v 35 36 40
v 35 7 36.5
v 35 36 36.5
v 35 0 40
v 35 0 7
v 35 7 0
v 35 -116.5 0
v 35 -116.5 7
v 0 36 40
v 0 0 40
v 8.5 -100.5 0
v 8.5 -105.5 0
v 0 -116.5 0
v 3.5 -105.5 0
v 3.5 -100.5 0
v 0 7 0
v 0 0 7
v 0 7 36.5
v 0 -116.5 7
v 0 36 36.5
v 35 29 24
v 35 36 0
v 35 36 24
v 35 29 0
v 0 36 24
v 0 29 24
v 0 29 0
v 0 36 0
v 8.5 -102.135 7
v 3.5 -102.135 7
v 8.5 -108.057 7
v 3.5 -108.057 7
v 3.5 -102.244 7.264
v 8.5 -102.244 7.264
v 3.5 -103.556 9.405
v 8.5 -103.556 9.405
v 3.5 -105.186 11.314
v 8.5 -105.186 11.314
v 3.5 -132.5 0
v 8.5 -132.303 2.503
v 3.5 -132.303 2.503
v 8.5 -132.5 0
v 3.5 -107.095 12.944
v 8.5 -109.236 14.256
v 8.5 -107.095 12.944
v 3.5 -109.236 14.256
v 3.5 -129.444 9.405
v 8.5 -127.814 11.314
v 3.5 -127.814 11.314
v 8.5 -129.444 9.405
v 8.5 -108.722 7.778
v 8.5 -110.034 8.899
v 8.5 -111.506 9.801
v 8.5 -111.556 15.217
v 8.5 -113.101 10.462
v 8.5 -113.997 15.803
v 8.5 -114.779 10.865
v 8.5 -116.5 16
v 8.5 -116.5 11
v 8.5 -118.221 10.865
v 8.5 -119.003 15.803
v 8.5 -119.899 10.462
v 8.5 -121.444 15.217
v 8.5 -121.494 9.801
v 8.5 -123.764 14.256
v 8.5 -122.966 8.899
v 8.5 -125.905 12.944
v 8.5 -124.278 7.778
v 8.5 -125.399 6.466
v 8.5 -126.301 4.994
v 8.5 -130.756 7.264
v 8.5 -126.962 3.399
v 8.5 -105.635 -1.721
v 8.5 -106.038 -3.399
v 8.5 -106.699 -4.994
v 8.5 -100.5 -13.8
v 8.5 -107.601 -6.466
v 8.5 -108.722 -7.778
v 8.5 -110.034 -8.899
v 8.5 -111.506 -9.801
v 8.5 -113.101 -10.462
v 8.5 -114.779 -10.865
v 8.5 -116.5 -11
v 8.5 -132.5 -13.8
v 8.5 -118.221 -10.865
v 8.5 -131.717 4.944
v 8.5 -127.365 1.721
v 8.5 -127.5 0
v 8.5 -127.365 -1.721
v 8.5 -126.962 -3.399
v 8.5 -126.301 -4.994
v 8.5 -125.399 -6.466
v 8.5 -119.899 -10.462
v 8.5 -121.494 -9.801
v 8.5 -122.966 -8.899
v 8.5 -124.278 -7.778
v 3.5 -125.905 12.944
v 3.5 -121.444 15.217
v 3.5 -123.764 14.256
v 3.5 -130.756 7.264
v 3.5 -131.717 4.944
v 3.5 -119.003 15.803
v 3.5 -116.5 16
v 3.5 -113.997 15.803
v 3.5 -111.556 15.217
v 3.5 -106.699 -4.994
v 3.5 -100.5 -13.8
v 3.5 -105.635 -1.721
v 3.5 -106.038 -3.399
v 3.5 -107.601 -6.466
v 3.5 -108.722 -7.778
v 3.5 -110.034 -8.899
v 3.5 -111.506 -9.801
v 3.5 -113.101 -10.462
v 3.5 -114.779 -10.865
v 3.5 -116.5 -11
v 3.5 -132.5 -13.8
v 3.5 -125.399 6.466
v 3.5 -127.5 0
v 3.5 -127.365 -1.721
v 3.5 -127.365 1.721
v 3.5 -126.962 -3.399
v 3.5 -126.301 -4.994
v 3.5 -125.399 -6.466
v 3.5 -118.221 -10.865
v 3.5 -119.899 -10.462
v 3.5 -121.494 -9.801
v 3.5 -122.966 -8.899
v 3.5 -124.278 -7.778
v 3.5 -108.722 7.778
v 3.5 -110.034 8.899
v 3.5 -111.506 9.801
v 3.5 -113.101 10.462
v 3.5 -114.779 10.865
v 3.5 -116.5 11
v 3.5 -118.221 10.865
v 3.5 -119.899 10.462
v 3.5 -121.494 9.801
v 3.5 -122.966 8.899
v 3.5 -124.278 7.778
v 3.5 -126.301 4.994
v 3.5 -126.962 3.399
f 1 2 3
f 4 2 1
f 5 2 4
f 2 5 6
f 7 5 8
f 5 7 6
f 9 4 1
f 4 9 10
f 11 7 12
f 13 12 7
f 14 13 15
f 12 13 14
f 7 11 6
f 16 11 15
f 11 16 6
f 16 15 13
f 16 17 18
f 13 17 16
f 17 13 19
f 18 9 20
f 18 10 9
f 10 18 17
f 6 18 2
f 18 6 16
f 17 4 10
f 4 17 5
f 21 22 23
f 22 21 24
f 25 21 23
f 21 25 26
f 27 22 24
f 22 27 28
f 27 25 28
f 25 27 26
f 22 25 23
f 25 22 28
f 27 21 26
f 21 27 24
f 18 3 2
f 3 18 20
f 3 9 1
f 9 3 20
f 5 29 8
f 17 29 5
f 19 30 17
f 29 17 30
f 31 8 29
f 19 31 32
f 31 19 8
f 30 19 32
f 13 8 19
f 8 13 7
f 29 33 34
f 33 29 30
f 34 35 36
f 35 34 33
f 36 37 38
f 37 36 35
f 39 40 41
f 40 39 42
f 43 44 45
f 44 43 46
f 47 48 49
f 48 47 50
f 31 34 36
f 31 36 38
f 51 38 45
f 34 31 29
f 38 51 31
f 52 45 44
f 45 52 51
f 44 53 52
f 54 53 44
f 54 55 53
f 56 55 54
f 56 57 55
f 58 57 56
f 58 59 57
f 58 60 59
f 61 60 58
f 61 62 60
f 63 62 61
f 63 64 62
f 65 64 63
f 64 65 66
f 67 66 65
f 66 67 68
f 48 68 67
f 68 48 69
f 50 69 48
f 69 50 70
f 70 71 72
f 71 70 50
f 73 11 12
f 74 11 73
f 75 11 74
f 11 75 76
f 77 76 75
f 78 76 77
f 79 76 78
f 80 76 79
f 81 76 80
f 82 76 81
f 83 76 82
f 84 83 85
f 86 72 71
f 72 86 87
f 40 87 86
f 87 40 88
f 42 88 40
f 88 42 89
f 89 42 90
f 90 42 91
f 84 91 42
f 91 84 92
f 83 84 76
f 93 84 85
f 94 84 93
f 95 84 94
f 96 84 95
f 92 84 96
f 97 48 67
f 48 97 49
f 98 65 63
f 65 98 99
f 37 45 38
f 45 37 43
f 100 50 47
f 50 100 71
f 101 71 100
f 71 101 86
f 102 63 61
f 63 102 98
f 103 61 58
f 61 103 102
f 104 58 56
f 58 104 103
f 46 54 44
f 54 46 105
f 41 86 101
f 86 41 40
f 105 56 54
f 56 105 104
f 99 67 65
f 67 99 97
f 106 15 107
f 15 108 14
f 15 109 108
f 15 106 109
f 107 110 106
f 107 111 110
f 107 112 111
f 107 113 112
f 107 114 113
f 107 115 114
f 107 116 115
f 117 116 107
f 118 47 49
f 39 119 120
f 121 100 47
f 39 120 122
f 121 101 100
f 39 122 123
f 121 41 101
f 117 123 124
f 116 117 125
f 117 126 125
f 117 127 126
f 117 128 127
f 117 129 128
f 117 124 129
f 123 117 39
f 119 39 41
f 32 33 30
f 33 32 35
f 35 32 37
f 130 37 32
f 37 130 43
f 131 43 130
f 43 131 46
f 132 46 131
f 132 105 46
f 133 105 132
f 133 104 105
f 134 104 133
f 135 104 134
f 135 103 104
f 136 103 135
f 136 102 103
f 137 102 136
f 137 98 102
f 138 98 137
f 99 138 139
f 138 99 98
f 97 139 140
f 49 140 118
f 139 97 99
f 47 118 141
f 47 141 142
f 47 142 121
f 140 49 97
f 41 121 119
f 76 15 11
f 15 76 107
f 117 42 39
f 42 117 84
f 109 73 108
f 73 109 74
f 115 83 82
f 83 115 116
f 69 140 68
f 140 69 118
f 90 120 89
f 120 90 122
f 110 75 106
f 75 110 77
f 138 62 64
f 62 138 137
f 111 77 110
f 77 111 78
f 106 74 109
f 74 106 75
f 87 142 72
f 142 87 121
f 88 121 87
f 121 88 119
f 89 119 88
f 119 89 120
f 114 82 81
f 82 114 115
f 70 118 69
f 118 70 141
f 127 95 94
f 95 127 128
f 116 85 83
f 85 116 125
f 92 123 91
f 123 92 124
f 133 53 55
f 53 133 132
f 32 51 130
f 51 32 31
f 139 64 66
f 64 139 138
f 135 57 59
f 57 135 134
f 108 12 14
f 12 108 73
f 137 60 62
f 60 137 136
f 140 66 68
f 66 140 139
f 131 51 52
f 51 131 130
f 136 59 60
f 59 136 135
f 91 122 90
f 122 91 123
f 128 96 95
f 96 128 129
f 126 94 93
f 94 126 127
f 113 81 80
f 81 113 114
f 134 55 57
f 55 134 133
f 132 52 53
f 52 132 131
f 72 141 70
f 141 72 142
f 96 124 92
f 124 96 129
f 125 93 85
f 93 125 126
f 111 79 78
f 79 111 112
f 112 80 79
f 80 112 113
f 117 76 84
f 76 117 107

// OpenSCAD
// Monitor-Mount Headphone Hanger
// Clips over monitor top edge — no screws, no damage
// PLA/PETG — 0.2mm, 4 walls, 20% infill
// Fits monitors 15-30mm thick (parametric)

MONITOR_T  = 22;   // Monitor top edge thickness — adjust!
CLIP_DEPTH = 40;   // How far clip wraps over top
HANGER_L   = 120;
HANGER_D   = 28;
HOOK_D     = 32;
HOOK_T     = 5.0;
WALL_T     = 3.5;
TPU_PAD    = false; // Set true to add pad cutout for TPU insert

module clip() {
    difference() {
        union() {
            // Front jaw
            cube([HANGER_D + WALL_T*2, WALL_T * 2, CLIP_DEPTH]);
            // Back jaw
            translate([0, MONITOR_T + WALL_T * 2, 0])
                cube([HANGER_D + WALL_T*2, WALL_T * 2, CLIP_DEPTH * 0.6]);
            // Top bridge
            translate([0, 0, CLIP_DEPTH - WALL_T])
                cube([HANGER_D + WALL_T*2, MONITOR_T + WALL_T * 4, WALL_T]);
            // Hanger arm
            translate([0, -HANGER_L + WALL_T, 0])
                cube([HANGER_D + WALL_T*2, HANGER_L, WALL_T * 2]);
        }
        // Friction pad slots (for rubber pads or TPU inserts)
        if (TPU_PAD) {
            translate([2, -1, 4])
                cube([HANGER_D + WALL_T*2 - 4, 3, CLIP_DEPTH - 8]);
            translate([2, MONITOR_T + WALL_T * 2 + 1, 4])
                cube([HANGER_D + WALL_T*2 - 4, 3, CLIP_DEPTH * 0.6 - 8]);
        }
    }
}

module hook() {
    translate([WALL_T, -HANGER_L + WALL_T, 0])
    rotate([90, 0, 90])
    difference() {
        union() {
            cylinder(d = HOOK_D, h = HOOK_T, $fn = 40);
            translate([-HOOK_D/2, -HOOK_D, 0])
                cube([HOOK_D, HOOK_D, HOOK_T]);
        }
        translate([0, 0, -1])
            cylinder(d = HOOK_D - HOOK_T*2, h = HOOK_T + 2, $fn = 40);
        translate([-HOOK_D/2, -HOOK_D - 1, -1])
            cube([HOOK_D, HOOK_D * 0.6, HOOK_T + 2]);
    }
}

clip();
hook();
